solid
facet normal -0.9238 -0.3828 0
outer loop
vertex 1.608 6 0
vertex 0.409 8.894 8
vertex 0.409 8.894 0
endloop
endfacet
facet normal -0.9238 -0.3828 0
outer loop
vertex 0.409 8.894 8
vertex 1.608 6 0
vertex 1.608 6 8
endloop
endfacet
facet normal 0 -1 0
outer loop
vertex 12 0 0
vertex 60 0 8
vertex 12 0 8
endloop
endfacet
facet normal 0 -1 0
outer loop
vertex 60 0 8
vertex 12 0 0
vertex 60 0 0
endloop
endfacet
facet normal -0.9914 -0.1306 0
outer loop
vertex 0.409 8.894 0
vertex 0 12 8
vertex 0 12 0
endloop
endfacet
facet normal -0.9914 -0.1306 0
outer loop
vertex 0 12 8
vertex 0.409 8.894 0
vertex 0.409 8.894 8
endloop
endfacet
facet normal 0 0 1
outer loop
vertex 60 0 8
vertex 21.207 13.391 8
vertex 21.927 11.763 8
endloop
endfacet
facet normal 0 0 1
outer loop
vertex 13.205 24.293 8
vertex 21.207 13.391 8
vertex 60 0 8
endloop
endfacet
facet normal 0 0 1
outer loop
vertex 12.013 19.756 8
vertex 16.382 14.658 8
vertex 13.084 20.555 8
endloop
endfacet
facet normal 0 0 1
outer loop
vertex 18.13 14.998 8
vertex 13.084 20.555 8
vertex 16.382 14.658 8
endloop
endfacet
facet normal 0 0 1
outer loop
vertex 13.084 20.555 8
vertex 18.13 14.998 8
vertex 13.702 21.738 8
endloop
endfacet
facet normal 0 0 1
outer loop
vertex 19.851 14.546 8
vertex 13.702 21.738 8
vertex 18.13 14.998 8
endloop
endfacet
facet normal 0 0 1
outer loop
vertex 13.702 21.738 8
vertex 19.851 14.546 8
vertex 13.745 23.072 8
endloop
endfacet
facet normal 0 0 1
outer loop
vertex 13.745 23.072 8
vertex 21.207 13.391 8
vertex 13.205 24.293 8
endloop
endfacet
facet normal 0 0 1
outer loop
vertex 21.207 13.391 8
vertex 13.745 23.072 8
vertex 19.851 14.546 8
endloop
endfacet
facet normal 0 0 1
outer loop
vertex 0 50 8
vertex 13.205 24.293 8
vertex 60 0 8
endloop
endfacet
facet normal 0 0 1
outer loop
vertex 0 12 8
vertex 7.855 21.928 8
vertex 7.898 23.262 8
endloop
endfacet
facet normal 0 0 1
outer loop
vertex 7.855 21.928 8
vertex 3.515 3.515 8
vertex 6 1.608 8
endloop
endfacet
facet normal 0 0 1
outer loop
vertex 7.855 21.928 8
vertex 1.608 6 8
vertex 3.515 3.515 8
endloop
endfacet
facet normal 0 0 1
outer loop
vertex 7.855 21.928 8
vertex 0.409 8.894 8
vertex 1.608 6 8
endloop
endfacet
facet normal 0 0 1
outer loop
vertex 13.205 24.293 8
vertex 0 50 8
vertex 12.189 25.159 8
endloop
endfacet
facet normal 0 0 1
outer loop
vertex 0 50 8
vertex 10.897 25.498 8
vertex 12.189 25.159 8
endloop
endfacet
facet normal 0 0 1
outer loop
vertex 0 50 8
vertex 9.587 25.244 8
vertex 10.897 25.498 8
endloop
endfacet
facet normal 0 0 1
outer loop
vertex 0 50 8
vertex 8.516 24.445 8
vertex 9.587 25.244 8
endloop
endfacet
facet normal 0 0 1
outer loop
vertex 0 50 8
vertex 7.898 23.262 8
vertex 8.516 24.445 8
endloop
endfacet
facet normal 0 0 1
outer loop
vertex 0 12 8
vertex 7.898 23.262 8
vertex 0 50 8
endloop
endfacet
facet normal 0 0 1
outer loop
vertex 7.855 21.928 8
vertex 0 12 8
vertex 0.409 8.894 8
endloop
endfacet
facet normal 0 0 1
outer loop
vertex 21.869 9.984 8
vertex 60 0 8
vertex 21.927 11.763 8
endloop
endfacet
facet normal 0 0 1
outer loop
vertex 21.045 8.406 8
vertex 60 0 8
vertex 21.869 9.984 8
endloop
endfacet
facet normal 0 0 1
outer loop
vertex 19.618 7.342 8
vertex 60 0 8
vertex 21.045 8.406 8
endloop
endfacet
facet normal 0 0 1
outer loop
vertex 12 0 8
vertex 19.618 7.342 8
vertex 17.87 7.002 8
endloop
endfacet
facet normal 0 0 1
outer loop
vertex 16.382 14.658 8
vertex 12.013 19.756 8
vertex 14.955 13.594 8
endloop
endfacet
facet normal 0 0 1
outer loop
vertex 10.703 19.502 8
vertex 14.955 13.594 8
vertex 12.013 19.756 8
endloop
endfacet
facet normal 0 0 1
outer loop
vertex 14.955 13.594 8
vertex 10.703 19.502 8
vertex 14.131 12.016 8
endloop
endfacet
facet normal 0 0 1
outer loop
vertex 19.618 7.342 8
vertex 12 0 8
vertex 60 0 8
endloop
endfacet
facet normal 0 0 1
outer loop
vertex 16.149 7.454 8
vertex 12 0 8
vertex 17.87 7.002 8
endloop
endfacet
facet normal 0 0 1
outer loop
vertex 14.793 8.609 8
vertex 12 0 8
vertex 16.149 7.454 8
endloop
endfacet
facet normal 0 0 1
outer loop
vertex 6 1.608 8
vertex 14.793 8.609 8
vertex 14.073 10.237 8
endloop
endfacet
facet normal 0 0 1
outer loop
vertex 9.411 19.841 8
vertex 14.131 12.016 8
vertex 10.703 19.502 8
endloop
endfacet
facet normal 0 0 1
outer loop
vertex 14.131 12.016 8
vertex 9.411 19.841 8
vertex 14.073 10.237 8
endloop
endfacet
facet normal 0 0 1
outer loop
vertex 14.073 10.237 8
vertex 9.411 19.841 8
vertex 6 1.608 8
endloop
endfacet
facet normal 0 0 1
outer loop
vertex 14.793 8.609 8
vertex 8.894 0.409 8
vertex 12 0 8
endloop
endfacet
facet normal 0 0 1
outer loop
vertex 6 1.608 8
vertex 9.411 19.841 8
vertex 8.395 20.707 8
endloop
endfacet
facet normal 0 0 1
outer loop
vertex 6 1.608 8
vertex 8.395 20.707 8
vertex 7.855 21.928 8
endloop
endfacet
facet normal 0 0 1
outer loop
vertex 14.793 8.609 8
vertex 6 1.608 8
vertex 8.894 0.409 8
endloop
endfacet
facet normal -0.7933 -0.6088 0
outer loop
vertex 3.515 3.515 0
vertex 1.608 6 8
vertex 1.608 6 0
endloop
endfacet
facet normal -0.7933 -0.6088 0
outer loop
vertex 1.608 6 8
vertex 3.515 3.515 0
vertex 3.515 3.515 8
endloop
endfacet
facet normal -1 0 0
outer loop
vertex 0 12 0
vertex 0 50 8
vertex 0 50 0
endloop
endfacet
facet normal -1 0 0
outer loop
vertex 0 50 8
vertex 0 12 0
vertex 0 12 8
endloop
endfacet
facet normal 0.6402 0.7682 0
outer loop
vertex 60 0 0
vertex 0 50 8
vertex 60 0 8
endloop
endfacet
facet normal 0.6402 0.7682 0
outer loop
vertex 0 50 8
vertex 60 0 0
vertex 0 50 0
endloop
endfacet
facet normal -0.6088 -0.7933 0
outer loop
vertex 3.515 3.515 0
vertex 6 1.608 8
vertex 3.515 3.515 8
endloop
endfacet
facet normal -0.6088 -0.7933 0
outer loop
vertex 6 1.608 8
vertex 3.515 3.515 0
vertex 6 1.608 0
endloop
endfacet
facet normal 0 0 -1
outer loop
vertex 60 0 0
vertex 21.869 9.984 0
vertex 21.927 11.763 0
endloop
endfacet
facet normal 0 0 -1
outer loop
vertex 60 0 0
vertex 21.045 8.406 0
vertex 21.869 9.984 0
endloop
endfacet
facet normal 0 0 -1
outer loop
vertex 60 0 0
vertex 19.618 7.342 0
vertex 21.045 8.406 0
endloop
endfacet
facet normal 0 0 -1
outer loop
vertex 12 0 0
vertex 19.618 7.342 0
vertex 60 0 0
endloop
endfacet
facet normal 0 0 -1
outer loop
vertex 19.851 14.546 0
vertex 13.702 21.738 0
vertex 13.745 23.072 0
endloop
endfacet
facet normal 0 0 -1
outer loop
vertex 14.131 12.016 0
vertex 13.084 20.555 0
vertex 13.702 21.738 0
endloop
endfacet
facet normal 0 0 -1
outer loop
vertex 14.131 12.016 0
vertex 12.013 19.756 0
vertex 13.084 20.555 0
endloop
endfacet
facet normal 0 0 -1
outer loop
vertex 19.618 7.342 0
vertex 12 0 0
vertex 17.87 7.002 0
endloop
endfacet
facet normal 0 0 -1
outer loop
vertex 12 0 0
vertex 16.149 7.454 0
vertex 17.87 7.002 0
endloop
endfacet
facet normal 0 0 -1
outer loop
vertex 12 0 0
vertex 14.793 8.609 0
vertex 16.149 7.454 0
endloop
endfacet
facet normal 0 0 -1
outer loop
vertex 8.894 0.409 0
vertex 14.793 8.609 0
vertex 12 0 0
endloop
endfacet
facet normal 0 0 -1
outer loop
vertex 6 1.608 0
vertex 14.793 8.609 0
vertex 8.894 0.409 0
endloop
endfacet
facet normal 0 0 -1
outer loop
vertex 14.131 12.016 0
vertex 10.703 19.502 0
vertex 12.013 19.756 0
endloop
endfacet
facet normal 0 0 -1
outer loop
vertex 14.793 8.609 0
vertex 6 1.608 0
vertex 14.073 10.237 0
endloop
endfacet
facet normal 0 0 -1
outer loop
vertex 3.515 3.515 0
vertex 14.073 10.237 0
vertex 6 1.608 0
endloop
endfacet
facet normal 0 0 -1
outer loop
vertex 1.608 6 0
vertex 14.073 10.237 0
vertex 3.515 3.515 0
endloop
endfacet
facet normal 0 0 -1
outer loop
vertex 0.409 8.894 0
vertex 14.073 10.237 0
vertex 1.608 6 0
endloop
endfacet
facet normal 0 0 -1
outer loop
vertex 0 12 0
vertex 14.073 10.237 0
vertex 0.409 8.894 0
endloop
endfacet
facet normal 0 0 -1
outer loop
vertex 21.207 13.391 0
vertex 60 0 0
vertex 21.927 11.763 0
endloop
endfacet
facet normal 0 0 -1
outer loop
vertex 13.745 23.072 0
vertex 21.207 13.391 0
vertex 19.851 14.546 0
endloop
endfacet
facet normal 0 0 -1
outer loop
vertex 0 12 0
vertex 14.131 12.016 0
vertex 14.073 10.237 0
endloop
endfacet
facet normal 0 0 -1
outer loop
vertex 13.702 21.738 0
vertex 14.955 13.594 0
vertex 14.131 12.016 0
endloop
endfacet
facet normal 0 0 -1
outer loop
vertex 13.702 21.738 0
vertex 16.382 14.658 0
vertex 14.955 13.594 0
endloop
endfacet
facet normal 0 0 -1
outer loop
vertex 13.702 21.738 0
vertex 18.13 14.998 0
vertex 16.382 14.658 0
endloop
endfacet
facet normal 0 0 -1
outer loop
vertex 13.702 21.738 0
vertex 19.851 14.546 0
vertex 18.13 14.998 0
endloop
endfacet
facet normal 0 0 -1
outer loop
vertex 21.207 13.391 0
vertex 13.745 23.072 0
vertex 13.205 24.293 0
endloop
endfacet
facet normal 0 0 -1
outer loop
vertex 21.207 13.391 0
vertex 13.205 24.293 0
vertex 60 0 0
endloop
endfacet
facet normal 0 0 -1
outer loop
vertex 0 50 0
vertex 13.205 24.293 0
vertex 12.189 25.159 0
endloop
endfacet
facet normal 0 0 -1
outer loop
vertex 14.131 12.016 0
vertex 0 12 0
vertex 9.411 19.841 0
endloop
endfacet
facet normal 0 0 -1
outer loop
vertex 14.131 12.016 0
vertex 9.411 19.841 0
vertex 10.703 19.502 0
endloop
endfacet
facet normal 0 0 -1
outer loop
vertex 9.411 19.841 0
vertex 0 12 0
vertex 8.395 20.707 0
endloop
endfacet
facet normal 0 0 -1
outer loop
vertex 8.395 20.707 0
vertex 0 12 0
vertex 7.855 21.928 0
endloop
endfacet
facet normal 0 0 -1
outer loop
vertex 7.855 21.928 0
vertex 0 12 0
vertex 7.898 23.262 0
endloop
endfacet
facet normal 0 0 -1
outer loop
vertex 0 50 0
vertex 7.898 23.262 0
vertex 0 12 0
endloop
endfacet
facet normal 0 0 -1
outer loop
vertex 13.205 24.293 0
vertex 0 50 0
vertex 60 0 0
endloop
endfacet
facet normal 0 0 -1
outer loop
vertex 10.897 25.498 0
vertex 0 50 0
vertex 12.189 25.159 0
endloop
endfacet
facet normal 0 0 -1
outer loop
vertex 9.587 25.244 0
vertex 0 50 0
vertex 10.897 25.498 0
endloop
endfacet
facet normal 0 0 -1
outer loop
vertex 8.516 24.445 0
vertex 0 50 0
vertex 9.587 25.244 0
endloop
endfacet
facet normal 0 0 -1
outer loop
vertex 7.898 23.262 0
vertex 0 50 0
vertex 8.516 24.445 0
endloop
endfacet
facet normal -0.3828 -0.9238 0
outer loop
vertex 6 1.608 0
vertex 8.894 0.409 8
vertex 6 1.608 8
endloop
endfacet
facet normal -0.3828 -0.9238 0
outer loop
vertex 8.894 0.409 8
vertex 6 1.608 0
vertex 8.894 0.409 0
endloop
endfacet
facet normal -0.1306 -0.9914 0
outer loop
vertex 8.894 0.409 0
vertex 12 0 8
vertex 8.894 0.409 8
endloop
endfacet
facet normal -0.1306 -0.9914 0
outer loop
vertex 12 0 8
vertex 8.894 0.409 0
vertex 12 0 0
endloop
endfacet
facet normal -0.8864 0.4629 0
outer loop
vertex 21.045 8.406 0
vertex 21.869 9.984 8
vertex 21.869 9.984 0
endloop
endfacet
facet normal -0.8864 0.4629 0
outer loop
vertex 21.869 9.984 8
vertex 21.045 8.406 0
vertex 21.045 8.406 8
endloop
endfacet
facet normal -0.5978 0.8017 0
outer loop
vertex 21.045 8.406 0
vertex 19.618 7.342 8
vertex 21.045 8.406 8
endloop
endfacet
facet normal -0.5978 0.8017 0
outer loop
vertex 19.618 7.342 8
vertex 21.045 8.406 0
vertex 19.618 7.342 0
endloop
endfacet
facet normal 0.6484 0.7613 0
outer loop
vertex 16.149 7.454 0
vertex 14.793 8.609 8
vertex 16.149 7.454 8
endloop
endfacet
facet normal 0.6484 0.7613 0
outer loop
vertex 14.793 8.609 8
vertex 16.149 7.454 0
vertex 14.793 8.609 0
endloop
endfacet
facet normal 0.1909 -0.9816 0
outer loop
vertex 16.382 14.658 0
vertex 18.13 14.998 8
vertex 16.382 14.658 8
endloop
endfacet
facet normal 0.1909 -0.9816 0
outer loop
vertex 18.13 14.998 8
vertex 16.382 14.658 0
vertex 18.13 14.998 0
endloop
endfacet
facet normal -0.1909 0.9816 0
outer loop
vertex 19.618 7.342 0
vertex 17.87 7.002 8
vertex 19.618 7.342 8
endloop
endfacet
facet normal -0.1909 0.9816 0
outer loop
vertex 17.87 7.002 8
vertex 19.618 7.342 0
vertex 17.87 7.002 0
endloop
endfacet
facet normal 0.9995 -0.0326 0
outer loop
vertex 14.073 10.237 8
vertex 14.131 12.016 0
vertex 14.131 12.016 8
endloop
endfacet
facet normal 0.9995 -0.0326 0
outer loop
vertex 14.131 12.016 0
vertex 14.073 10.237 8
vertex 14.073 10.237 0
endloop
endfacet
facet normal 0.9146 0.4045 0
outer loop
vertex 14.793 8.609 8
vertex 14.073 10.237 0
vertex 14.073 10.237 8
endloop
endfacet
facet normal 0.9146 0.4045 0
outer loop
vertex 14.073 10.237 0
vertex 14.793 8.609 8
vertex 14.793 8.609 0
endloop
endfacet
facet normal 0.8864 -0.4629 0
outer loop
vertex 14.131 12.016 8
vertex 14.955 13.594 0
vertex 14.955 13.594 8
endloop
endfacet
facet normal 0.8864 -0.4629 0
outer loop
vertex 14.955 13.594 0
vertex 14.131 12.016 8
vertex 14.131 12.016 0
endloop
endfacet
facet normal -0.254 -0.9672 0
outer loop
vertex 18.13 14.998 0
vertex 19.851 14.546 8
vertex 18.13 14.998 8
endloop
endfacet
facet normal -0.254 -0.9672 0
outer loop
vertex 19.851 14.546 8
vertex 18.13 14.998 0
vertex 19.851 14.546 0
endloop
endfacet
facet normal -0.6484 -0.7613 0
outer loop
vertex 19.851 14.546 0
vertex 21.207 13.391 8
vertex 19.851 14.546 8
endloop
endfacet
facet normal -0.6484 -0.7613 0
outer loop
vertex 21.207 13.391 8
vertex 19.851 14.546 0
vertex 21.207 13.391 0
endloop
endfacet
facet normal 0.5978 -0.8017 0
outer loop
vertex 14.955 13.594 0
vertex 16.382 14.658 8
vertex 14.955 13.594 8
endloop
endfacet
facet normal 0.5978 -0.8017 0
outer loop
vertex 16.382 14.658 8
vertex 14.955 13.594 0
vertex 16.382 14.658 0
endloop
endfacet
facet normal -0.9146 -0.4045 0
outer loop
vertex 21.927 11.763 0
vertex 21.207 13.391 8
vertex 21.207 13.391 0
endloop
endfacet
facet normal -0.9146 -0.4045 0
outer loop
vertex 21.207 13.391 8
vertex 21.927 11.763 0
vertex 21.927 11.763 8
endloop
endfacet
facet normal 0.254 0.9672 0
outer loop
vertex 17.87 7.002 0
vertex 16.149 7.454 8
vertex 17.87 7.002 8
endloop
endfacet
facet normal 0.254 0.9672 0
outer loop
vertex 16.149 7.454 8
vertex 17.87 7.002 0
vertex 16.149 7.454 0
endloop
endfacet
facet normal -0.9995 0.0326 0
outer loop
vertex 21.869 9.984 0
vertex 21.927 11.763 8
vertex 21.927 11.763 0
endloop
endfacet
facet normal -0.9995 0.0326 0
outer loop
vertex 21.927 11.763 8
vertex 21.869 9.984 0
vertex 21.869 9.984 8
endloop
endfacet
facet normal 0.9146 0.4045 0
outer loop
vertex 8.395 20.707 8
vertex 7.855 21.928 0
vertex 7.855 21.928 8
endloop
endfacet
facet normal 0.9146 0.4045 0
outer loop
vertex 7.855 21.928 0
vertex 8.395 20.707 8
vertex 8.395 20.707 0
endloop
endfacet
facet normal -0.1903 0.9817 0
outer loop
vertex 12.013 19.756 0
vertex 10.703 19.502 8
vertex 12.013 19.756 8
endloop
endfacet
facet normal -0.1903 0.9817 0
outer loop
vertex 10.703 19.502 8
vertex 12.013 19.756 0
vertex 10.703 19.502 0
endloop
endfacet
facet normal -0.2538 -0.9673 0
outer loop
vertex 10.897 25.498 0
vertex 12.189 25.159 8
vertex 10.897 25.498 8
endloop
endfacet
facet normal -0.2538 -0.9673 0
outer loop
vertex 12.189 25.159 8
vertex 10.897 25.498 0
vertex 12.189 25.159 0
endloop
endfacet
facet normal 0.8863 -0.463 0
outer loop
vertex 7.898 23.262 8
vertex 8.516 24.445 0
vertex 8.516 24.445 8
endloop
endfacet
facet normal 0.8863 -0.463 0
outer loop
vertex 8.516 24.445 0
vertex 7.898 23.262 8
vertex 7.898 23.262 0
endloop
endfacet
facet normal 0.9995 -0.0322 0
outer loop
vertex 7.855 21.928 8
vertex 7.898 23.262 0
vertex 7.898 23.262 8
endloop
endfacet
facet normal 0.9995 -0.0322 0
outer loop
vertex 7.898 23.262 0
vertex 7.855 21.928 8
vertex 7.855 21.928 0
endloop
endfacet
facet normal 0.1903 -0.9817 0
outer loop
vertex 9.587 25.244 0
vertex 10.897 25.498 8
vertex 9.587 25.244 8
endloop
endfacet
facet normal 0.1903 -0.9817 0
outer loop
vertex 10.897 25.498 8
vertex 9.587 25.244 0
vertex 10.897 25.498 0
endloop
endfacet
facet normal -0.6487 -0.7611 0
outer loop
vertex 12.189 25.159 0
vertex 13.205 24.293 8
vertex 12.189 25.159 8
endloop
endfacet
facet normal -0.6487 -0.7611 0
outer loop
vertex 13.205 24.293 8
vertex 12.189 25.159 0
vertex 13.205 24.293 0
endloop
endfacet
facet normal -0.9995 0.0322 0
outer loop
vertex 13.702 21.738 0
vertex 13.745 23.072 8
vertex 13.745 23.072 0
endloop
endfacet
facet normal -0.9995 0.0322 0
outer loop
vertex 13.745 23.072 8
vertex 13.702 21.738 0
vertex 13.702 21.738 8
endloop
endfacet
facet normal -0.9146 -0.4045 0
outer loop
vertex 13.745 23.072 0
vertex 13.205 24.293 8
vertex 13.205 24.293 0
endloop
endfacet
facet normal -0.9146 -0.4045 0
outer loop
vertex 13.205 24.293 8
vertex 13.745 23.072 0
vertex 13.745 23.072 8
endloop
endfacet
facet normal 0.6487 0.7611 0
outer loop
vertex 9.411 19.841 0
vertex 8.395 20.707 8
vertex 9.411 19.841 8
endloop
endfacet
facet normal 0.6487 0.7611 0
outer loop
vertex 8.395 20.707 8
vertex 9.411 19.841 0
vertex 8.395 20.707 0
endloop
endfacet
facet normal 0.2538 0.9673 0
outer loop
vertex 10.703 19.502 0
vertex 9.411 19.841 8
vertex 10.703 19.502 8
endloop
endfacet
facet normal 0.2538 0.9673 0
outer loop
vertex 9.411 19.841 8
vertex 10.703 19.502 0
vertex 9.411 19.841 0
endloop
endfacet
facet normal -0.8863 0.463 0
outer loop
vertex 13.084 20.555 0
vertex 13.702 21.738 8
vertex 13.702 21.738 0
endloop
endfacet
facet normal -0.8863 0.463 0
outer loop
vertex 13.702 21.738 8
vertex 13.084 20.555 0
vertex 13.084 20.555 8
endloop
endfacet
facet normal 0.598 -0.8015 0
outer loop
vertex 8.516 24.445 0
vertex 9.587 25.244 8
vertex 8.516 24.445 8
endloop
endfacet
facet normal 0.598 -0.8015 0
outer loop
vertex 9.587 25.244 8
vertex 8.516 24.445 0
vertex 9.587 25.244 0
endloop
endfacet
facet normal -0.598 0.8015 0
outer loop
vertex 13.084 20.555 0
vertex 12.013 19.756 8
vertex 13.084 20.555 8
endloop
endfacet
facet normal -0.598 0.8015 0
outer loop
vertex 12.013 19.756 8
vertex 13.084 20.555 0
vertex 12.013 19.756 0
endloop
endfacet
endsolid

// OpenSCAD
$fn = 32;

// ----------------------------------------------------------------------
// Bracket plate: corner pad 60 x 50, fillet R12
// ----------------------------------------------------------------------

// --- parameters (mm) ---
hole_r = 3;               // bolt hole radius
plate_t = 8;              // plate thickness, Z (extrusion height)
leg_a = 60;               // base leg
leg_b = 50;               // height leg
fillet_r = 12;            // right-angle fillet radius

hole_d1 = 2 * hole_r + 2;
hole_d2 = 2 * hole_r;

profile = [[12, 0], [60, 0], [0, 50], [0, 12], [0.409, 8.894], [1.608, 6], [3.515, 3.515], [6, 1.608], [8.894, 0.409]];  // primary outline, 9 points, counter clockwise
void_1 = [[21.927, 11.763], [21.207, 13.391], [19.851, 14.546], [18.13, 14.998], [16.382, 14.658], [14.955, 13.594], [14.131, 12.016], [14.073, 10.237], [14.793, 8.609], [16.149, 7.454], [17.87, 7.002], [19.618, 7.342], [21.045, 8.406], [21.869, 9.984]];  // mount hole 1, 14 points
void_2 = [[13.745, 23.072], [13.205, 24.293], [12.189, 25.159], [10.897, 25.498], [9.587, 25.244], [8.516, 24.445], [7.898, 23.262], [7.855, 21.928], [8.395, 20.707], [9.411, 19.841], [10.703, 19.502], [12.013, 19.756], [13.084, 20.555], [13.702, 21.738]];  // mount hole 2, 14 points

// --- the one profile operation ---
difference() {
  linear_extrude(height = plate_t) polygon(points = profile);
  translate([0, 0, -1])
    linear_extrude(height = plate_t + 2) polygon(points = void_1);
  translate([0, 0, -1])
    linear_extrude(height = plate_t + 2) polygon(points = void_2);
}
